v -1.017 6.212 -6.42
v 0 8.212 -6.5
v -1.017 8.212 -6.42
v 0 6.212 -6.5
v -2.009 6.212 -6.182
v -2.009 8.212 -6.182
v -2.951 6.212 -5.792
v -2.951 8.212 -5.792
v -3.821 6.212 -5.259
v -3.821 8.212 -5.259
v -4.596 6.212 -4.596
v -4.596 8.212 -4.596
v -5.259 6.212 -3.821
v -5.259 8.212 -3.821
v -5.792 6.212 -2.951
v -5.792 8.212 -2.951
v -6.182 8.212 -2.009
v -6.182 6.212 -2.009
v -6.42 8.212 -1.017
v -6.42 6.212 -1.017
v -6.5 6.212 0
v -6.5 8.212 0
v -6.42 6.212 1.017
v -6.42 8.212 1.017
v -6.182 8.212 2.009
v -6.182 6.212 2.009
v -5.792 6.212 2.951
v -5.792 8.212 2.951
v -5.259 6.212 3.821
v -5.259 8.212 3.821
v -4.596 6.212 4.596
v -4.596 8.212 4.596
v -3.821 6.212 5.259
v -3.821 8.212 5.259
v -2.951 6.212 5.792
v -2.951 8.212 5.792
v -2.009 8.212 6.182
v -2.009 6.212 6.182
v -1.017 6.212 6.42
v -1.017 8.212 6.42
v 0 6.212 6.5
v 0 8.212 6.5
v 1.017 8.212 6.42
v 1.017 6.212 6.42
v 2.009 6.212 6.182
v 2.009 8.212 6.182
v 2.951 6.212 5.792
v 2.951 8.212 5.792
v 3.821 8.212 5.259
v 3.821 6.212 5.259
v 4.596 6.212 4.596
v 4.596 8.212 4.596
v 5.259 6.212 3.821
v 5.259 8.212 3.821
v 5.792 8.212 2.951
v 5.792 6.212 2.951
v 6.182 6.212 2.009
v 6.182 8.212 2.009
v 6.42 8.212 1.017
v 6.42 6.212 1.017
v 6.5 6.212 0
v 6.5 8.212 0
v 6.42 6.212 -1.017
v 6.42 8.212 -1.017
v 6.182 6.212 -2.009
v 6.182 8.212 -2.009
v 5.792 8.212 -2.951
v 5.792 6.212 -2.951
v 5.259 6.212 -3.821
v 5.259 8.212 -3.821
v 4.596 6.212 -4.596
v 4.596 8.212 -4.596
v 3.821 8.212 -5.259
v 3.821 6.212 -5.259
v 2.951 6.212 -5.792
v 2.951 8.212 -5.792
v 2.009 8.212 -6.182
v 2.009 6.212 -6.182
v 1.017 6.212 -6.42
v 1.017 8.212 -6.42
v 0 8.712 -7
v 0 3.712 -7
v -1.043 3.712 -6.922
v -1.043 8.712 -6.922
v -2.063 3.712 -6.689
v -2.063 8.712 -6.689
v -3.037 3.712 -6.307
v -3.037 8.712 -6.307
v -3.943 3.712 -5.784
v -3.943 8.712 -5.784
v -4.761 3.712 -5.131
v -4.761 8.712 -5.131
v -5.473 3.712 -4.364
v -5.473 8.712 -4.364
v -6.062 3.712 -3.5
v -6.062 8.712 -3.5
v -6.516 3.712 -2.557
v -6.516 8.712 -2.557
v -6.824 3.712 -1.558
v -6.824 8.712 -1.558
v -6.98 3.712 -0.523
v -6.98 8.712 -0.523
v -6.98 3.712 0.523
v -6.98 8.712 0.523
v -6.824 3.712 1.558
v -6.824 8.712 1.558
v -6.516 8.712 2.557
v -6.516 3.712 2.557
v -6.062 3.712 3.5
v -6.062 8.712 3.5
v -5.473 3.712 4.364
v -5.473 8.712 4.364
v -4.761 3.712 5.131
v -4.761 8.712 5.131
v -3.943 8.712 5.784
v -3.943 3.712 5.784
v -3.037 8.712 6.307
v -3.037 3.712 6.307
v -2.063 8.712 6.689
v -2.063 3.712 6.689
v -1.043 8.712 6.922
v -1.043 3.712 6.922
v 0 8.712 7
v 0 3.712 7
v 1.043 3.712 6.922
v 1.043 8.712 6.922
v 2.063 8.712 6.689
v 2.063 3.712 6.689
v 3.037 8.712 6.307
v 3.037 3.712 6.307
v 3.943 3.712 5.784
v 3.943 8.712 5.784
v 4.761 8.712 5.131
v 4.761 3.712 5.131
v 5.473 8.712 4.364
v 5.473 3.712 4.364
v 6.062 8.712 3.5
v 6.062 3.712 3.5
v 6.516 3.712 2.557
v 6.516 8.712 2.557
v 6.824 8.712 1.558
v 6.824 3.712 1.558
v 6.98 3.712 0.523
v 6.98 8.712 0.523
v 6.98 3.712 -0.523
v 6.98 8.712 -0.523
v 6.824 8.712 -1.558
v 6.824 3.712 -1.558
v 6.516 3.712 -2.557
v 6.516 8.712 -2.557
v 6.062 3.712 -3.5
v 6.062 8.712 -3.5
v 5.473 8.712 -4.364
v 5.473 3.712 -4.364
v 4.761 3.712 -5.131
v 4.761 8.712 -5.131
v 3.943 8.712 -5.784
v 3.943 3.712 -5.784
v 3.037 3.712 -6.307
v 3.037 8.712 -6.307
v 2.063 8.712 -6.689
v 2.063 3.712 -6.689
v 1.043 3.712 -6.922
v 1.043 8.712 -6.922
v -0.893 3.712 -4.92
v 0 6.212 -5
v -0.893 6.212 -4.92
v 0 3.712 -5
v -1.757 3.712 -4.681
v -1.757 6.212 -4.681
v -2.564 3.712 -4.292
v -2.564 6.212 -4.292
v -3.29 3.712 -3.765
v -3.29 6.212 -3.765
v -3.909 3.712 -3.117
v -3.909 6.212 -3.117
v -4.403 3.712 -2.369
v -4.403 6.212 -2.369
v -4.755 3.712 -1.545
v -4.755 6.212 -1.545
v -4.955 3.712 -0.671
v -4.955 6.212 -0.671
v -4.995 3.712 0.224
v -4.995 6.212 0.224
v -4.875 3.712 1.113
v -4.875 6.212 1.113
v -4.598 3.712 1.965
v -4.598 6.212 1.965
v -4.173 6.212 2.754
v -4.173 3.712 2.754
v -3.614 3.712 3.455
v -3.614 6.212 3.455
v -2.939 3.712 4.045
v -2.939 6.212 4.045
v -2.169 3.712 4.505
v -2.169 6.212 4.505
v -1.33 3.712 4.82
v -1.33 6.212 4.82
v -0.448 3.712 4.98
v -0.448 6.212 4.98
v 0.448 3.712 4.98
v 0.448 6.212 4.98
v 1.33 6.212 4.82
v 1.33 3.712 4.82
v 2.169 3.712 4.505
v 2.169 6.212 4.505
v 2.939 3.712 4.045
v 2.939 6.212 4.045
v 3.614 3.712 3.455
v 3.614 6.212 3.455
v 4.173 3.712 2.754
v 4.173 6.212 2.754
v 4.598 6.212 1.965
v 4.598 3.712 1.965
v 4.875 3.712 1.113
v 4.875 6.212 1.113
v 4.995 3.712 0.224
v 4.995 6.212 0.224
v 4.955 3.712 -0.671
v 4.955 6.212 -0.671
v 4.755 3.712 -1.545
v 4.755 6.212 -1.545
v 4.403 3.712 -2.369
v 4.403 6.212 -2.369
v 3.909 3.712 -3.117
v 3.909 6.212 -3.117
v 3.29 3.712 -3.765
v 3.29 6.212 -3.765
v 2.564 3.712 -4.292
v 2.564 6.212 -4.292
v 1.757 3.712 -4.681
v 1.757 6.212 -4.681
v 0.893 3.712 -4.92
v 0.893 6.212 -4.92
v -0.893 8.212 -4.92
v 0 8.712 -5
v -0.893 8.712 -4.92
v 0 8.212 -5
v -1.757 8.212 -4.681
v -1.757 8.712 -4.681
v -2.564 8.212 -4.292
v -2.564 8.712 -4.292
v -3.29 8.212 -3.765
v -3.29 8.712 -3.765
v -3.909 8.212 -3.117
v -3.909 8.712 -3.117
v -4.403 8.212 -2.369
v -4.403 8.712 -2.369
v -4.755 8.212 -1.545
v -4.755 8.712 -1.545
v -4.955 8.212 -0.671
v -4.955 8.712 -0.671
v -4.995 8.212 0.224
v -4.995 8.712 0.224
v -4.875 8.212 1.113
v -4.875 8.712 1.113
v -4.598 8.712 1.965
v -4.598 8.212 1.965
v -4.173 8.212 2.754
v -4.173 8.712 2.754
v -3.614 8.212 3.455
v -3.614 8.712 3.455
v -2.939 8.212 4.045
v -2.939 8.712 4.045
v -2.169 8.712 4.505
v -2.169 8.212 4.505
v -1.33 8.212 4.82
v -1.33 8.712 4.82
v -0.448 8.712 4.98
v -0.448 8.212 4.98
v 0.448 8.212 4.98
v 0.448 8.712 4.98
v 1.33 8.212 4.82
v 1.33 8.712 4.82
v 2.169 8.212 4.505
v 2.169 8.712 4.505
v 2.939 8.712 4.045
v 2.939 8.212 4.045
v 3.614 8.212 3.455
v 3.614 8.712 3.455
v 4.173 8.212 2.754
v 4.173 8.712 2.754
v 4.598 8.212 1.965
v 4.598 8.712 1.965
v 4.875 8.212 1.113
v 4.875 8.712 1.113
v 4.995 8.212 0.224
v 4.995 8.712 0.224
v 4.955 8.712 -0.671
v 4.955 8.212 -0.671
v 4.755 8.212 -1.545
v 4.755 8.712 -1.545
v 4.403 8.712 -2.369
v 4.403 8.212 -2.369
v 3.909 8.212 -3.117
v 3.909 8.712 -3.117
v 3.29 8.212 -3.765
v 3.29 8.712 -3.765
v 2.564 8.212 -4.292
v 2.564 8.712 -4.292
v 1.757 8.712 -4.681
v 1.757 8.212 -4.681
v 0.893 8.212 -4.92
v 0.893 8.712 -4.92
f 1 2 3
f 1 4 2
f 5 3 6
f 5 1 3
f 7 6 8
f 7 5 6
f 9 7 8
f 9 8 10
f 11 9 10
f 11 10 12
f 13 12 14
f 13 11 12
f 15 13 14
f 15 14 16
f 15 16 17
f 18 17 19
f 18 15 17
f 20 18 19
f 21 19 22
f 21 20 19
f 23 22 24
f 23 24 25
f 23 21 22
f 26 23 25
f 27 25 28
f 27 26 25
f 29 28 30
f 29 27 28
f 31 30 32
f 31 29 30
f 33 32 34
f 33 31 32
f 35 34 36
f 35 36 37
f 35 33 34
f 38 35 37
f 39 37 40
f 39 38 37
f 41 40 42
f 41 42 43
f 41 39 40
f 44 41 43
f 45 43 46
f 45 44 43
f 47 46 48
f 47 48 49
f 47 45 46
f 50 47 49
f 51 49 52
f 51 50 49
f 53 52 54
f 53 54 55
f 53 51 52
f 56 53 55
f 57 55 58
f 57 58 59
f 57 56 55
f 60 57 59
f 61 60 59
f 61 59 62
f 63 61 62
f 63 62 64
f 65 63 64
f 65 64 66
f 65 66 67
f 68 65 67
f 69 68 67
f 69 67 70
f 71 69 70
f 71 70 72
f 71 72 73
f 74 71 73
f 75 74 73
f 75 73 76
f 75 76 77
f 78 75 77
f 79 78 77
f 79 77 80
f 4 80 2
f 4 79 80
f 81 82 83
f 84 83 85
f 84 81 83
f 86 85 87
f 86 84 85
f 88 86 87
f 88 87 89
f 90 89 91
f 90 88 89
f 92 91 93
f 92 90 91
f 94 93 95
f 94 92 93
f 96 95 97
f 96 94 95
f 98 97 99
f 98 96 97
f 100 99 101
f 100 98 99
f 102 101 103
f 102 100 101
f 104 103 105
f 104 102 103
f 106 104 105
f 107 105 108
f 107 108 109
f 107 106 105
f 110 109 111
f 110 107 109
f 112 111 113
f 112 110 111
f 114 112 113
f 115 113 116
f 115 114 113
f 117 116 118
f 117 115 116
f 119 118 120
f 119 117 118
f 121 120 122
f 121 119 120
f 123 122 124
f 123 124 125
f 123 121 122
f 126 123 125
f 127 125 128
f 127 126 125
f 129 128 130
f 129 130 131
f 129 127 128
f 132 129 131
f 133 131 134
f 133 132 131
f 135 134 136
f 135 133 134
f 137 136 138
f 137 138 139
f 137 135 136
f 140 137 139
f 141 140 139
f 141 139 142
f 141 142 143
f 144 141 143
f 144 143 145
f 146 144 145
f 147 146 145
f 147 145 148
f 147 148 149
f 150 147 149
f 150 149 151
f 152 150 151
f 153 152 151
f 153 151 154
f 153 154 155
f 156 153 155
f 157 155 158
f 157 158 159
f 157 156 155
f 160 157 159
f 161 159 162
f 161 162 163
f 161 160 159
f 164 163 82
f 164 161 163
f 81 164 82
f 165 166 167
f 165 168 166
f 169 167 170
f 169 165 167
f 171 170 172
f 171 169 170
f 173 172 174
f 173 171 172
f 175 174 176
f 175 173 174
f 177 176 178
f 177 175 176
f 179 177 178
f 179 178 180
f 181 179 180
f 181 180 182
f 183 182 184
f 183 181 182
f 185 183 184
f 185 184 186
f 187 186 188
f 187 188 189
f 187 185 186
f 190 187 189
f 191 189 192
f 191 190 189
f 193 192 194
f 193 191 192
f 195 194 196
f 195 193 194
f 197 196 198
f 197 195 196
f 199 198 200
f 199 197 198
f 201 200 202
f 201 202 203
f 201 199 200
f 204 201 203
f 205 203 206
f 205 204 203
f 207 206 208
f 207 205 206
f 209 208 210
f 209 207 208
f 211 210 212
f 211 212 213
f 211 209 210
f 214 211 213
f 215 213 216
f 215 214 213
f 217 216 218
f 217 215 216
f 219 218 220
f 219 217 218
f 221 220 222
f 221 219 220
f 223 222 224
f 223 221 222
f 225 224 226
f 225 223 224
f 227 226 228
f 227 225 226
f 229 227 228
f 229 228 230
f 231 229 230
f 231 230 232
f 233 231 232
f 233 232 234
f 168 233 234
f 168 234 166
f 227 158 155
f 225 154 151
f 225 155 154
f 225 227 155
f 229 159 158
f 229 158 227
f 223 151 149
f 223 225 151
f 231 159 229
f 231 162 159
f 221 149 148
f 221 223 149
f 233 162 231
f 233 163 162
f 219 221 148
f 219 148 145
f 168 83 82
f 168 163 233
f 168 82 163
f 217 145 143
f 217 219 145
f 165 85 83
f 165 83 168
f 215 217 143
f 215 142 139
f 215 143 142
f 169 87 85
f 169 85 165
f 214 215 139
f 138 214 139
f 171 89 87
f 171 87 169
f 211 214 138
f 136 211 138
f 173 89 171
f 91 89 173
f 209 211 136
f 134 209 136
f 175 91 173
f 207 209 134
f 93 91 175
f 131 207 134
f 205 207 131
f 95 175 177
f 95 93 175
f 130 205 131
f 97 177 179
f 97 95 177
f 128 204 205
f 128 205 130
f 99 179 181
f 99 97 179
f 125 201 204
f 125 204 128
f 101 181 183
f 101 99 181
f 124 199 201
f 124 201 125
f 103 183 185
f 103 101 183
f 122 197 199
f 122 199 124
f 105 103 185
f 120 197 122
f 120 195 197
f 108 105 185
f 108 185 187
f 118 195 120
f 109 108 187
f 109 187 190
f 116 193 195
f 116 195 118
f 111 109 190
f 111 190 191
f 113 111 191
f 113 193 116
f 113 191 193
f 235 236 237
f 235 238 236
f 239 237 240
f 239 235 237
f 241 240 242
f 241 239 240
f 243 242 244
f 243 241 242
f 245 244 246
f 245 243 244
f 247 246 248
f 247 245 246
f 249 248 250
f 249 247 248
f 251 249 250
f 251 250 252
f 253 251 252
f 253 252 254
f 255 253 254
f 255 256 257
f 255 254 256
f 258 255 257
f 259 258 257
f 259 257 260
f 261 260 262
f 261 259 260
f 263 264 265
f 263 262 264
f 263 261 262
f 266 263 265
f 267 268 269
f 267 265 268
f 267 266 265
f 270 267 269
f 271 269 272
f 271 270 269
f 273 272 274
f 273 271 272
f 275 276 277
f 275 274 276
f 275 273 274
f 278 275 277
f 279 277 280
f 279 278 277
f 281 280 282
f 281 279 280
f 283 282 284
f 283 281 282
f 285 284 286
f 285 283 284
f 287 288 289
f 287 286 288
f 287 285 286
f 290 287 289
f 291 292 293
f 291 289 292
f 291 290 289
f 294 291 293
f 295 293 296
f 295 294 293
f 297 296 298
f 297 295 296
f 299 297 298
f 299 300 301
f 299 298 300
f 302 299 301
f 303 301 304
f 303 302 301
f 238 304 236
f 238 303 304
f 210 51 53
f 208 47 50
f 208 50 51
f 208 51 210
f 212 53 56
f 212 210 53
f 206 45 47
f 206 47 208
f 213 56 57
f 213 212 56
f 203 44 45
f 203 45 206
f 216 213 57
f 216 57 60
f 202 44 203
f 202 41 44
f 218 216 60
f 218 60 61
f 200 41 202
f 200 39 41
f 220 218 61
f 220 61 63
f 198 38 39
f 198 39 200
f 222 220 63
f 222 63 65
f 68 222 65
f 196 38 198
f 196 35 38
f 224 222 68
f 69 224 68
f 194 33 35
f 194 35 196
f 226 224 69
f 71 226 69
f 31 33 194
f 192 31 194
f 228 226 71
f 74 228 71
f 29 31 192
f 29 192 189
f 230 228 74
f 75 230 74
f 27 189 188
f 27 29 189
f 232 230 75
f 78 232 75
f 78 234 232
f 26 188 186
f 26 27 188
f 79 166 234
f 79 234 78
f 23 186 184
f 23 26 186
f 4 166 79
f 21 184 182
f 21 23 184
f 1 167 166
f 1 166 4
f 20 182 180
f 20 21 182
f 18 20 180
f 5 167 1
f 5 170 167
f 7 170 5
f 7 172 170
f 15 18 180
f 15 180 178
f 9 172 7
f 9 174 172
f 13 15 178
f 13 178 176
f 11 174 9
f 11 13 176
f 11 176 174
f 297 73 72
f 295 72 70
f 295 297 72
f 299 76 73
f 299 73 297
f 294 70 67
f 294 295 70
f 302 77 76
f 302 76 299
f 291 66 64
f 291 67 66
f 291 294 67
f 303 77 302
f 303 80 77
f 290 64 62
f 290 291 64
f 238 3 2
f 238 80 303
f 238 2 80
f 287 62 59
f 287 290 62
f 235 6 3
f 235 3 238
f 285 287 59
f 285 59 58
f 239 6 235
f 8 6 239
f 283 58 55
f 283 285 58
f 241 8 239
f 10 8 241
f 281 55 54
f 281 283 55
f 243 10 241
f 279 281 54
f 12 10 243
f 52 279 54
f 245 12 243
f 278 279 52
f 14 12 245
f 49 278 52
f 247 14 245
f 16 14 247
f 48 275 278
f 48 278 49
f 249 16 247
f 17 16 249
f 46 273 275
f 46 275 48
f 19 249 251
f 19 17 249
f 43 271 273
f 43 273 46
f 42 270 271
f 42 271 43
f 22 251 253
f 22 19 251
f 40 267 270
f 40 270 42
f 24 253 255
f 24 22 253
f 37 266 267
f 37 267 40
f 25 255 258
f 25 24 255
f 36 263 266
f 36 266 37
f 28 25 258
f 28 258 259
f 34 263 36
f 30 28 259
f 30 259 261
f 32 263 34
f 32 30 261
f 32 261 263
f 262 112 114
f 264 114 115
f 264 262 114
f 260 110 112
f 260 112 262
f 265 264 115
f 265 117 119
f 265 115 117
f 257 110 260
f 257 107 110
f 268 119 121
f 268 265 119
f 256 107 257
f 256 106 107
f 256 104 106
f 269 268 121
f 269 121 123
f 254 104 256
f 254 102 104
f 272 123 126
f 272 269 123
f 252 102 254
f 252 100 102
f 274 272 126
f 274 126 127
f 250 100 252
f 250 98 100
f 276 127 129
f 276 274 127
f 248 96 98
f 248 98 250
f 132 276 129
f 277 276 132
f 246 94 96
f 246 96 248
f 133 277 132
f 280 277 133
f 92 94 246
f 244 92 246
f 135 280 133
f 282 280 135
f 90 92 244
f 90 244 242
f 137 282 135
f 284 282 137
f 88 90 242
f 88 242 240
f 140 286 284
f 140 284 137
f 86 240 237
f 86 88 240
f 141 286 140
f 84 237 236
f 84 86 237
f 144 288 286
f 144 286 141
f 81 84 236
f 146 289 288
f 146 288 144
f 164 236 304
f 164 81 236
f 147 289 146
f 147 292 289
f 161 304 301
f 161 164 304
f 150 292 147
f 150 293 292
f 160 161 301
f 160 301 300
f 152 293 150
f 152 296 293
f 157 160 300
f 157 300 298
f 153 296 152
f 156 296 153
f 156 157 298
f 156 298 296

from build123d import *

# Parameters (mm, degrees)
SKETCH3_R          = 7
CUT_EXTRUDE1_DEPTH = 5


with BuildPart() as part:
    # Sketch2 → Revolve1 (revolve)
    with BuildSketch(Plane(origin=(0, 0, 0), x_dir=(0, 0, -1), z_dir=(1, 0, 0))):
        Polygon((5, 3.711600936), (7, 3.711600936), (7, 13.711600936), (5, 13.711600936), (5, 8.211600936), (6.5, 8.211600936), (6.5, 6.211600936), (5, 6.211600936), align=None)
    revolve(axis=Axis((0, 0, 0), (0, 1, 0)))

    # Sketch3 → Cut-Extrude1 (cut)
    with BuildSketch(Plane(origin=(0, 13.711600936, 0), x_dir=(1, 0, 0), z_dir=(0, 1, 0))):
        Circle(SKETCH3_R)
    extrude(amount=-CUT_EXTRUDE1_DEPTH, mode=Mode.SUBTRACT)


solid = part.part
